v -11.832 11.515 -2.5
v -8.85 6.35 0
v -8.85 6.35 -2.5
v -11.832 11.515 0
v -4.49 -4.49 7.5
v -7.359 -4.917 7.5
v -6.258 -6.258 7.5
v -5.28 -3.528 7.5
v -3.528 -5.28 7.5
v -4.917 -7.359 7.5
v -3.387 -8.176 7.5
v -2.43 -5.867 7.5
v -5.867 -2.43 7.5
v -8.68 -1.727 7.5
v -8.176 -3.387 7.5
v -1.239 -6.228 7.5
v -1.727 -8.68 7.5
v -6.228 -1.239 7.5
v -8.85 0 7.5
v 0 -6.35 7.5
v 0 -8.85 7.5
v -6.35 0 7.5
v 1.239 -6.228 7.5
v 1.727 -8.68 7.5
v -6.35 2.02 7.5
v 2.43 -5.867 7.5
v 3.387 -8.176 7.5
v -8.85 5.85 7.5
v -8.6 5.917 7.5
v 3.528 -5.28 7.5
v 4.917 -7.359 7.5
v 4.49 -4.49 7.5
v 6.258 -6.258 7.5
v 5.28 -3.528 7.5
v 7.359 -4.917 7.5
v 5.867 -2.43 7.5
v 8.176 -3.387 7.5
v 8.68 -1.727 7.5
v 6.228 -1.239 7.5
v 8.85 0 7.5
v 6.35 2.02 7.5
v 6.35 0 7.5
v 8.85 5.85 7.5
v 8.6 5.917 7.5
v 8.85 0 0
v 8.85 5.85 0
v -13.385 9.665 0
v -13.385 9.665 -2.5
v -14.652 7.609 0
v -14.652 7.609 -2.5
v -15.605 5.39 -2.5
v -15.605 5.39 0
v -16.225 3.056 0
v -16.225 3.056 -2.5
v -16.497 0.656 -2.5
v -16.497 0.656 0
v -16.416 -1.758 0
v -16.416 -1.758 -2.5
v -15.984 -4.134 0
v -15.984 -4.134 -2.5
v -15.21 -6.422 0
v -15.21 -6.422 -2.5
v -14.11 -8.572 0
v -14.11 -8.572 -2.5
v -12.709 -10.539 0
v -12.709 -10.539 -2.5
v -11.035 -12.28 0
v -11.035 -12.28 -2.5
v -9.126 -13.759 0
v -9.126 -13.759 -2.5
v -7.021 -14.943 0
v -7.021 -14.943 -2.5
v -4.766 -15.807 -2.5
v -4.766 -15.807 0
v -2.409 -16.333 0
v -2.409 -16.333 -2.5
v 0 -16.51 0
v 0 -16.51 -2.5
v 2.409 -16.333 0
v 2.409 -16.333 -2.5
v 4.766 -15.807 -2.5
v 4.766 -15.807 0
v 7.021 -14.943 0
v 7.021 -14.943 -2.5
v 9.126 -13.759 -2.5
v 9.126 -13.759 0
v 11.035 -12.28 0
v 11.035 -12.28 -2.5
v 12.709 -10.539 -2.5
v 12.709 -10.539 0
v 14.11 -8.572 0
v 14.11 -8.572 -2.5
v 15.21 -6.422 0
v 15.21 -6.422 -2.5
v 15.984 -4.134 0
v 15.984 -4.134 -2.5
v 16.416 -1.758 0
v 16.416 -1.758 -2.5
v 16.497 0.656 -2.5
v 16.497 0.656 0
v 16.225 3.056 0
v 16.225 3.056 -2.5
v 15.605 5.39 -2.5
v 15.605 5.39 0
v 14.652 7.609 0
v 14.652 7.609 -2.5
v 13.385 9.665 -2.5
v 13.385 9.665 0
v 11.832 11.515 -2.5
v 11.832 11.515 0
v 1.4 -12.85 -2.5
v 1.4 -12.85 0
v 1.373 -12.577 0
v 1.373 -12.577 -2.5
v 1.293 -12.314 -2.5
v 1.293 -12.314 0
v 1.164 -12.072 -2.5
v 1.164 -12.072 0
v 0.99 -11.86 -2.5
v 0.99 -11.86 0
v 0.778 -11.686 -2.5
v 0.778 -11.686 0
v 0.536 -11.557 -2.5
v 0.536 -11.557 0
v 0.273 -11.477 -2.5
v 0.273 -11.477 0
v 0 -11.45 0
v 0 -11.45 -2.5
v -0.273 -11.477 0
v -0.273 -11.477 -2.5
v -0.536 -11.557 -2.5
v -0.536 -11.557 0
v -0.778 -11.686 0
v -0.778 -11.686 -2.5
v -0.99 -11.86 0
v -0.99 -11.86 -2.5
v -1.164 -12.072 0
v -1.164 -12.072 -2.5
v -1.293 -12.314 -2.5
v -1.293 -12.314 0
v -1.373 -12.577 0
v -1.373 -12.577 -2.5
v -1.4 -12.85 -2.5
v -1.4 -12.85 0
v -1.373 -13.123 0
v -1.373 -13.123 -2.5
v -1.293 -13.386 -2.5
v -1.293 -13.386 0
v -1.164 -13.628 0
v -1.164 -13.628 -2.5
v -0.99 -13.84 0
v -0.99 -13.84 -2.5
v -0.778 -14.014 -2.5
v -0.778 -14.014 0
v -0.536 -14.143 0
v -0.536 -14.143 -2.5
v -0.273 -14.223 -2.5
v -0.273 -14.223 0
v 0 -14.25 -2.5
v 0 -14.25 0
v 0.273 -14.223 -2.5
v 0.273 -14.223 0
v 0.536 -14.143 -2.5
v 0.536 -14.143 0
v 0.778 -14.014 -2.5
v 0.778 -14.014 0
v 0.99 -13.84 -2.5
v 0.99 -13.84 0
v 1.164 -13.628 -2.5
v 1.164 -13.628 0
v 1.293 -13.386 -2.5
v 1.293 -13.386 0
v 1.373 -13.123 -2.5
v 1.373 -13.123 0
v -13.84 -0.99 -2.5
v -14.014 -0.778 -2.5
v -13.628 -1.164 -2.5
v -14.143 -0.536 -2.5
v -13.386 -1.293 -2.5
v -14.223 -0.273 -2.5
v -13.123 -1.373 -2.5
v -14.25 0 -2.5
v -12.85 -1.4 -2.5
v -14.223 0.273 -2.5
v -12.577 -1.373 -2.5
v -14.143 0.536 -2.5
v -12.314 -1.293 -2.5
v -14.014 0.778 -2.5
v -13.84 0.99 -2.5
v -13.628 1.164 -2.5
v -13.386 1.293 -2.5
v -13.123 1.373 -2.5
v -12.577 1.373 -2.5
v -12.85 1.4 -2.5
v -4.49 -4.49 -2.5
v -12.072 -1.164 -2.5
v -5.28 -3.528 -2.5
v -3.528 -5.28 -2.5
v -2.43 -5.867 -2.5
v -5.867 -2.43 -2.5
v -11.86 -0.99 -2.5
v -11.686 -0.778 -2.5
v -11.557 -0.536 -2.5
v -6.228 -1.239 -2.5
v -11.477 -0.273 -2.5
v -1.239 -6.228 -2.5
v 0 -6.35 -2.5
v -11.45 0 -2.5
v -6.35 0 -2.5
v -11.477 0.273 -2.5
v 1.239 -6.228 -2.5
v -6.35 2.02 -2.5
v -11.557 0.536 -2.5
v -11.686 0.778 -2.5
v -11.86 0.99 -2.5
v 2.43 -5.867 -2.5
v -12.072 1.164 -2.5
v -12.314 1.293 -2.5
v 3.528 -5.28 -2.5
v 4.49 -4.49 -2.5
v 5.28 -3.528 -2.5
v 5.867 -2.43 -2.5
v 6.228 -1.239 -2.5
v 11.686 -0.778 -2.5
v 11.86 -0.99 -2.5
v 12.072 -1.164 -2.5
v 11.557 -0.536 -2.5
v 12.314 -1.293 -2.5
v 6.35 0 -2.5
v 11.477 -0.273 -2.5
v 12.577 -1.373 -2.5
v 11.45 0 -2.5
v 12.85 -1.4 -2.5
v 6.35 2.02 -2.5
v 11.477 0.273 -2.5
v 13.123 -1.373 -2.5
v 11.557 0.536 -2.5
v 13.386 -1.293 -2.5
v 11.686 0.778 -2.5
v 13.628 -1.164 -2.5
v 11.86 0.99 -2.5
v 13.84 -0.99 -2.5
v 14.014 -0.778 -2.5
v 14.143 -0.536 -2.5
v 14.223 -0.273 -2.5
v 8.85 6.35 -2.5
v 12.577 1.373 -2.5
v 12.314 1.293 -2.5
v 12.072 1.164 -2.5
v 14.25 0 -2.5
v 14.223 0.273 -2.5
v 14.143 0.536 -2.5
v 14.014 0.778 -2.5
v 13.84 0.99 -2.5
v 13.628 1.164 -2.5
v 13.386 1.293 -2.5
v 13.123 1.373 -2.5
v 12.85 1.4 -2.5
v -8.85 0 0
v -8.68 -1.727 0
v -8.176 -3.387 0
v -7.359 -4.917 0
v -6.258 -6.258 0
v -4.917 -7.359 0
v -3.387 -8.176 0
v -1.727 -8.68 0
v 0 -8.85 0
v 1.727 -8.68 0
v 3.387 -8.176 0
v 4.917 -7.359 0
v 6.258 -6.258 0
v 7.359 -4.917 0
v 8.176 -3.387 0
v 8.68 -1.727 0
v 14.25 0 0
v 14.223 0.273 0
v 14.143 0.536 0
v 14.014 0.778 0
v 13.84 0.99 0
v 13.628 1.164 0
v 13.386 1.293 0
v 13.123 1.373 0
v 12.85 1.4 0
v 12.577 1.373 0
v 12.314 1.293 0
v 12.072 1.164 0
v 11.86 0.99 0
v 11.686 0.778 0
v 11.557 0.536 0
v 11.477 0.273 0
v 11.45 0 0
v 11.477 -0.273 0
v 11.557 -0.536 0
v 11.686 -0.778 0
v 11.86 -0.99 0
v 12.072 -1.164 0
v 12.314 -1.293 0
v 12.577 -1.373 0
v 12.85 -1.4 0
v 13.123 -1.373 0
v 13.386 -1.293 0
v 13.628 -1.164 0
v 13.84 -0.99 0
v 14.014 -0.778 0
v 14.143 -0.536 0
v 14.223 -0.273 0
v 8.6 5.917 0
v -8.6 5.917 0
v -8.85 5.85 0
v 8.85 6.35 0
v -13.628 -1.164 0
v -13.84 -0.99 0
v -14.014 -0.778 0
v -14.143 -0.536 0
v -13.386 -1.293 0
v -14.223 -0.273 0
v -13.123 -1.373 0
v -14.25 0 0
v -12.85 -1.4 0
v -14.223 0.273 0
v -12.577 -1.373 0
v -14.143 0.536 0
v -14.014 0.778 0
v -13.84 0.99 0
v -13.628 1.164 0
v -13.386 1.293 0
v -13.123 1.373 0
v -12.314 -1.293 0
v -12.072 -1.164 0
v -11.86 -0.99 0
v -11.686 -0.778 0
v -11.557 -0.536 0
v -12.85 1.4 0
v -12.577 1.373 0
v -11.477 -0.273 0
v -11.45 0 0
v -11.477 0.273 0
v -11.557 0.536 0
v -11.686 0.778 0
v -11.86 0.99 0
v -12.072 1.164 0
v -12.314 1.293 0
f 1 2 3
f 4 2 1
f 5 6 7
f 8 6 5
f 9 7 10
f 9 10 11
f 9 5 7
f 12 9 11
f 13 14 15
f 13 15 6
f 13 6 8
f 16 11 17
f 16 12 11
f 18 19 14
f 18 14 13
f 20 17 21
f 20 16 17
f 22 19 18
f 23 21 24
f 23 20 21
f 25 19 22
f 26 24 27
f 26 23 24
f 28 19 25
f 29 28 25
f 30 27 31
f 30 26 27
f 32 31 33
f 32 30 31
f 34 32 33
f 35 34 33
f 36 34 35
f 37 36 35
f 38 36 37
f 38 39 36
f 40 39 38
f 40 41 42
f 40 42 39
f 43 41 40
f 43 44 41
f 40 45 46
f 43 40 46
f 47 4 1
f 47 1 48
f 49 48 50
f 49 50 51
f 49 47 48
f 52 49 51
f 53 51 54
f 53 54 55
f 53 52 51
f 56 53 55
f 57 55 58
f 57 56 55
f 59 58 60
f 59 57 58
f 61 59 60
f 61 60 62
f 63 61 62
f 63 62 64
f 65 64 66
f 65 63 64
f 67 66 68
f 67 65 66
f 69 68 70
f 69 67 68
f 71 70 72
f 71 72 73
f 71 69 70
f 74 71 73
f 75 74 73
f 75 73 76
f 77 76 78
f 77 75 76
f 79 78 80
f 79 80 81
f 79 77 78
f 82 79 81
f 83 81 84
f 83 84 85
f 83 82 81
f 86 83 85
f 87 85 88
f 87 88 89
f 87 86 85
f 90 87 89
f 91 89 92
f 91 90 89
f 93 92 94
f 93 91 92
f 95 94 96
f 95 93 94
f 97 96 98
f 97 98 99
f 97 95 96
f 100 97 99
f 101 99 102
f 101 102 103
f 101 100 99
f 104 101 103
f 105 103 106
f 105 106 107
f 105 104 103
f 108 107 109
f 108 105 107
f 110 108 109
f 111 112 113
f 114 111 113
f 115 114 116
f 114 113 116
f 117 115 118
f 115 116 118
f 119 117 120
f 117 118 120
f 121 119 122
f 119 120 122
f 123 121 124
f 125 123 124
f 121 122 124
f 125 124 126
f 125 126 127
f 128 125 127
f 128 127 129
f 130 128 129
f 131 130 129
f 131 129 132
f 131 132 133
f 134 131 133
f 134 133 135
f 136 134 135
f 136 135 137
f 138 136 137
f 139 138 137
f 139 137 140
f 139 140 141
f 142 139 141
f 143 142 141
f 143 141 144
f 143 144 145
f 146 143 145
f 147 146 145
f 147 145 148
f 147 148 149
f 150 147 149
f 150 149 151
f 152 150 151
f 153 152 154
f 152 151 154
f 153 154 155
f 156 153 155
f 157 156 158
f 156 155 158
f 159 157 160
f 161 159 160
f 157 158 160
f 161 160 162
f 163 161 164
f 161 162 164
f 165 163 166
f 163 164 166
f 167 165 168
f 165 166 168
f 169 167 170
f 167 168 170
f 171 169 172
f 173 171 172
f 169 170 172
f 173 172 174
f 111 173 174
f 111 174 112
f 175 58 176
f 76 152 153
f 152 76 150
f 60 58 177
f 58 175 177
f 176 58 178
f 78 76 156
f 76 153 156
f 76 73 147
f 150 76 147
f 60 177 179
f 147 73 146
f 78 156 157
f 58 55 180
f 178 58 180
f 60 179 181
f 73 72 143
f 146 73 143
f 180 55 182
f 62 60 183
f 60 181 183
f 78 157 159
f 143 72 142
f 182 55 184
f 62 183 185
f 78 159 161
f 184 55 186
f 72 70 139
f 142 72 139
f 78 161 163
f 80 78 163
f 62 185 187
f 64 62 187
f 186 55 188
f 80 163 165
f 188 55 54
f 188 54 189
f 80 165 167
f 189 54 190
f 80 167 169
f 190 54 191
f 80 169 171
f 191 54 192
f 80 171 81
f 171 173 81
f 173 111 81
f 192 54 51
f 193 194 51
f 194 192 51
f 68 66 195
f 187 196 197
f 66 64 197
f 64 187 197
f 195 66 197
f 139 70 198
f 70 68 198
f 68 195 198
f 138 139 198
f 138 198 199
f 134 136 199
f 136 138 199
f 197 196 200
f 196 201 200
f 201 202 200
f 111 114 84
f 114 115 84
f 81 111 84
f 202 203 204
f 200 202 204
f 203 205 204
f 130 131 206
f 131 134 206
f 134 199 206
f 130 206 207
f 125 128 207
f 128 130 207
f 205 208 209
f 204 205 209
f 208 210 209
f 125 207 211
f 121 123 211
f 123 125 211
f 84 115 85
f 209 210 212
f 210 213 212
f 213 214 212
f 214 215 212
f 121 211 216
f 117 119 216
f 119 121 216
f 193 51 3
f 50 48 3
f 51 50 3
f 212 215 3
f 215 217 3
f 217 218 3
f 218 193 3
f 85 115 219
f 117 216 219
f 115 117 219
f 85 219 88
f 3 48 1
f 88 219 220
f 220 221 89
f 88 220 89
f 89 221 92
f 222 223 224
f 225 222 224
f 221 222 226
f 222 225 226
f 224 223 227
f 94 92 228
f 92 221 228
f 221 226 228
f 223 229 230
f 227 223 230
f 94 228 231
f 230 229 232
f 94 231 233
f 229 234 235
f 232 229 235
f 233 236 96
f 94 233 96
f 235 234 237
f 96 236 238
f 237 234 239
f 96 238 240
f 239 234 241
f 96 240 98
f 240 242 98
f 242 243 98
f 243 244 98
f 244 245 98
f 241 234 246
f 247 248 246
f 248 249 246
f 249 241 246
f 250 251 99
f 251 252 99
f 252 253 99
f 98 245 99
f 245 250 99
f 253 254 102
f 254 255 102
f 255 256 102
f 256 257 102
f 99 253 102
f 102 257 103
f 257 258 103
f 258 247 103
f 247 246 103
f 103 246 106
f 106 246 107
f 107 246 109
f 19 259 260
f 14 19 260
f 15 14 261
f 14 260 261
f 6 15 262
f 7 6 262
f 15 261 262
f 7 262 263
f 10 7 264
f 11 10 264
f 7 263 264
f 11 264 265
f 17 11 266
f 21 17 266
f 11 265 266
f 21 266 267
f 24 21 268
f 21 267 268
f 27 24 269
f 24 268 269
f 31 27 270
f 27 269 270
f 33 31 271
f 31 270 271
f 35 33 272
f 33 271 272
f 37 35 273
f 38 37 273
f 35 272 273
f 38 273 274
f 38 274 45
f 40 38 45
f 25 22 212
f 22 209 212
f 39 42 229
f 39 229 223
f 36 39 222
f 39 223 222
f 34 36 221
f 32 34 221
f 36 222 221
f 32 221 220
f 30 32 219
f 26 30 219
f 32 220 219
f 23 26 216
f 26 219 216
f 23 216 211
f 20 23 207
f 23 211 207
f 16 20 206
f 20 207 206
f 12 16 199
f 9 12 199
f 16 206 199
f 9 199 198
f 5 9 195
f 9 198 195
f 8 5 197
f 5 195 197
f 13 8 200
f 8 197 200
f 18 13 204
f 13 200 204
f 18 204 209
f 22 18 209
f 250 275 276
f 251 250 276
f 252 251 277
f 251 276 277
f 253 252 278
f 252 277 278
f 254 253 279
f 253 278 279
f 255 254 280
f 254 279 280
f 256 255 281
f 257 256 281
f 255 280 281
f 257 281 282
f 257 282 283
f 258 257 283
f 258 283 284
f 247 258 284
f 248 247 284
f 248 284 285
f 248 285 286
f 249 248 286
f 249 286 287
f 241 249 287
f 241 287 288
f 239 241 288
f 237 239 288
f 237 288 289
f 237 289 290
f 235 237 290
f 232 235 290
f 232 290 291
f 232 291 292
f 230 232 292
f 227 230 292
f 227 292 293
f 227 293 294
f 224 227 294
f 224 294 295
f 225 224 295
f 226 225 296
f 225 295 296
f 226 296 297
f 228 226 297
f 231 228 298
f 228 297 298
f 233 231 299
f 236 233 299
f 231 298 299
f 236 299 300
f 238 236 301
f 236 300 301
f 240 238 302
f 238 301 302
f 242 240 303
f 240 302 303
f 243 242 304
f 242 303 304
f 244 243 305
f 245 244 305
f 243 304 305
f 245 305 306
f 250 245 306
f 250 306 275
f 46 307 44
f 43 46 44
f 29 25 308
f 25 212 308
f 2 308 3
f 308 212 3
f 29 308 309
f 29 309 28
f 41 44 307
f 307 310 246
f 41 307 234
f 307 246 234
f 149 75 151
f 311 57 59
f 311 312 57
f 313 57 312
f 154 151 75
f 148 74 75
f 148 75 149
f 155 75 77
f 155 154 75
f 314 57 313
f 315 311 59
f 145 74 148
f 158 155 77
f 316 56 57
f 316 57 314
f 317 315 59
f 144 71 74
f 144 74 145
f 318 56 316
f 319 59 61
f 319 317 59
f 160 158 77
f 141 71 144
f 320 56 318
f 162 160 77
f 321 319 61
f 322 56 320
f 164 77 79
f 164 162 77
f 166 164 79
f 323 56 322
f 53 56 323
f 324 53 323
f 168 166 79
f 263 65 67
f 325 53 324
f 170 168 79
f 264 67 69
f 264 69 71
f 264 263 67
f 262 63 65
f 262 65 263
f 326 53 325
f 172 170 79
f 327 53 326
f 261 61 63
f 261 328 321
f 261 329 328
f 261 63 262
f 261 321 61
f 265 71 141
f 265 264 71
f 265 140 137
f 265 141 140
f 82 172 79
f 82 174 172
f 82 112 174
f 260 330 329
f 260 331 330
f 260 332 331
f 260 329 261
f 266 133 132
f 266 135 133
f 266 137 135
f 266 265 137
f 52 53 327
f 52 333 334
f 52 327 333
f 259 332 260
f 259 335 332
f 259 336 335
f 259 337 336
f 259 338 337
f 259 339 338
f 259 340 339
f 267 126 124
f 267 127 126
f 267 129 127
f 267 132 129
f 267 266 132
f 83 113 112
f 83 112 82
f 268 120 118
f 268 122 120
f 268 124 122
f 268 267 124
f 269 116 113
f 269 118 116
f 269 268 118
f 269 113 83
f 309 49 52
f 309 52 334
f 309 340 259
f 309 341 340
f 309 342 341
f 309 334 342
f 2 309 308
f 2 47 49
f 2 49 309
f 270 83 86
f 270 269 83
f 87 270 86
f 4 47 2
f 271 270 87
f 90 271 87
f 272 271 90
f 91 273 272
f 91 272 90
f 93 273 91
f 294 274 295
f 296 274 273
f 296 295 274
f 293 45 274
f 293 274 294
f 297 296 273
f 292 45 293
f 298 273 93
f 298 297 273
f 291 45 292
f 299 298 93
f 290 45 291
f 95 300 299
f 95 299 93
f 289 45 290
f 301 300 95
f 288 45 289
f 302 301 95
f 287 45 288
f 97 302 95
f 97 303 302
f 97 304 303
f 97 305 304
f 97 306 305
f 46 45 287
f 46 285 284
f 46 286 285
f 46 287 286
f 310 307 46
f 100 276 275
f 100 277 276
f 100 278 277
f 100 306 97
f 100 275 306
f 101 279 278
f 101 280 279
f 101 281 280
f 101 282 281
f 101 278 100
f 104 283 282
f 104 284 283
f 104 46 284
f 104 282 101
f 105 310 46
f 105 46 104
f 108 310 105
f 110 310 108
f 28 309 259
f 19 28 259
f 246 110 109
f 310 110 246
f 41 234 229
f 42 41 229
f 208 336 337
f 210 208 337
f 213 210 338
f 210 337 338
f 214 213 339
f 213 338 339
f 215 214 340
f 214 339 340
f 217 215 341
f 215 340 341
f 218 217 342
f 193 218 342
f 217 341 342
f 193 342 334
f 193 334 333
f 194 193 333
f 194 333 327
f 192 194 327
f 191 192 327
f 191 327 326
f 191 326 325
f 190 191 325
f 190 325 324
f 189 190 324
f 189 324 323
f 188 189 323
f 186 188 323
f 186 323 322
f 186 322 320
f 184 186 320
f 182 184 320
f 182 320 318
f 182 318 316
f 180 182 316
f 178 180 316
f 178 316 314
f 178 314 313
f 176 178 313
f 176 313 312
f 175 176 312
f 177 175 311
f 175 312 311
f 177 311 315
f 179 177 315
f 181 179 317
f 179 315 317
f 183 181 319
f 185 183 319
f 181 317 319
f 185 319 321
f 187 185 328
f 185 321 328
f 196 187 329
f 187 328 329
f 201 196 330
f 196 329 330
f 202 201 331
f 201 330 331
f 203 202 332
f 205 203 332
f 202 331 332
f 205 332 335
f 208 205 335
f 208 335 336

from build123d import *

# Parameters (mm, degrees)
F1_DEPTH = 2.5
F2_DEPTH = 7.5
F3_SIZE  = 0.5
F4_R     = 1.4
F5_DEPTH = 25


with BuildPart() as f1:
    # F0 (on Top) → F1 (new body)
    with BuildSketch(Plane.XY):
        with BuildLine():
            Line((11.83183, 11.514682), (8.85, 6.35))
            Line((8.85, 6.35), (8.85, 0))
            ThreePointArc((8.85, 0), (0, -8.85), (-8.85, 0))
            Line((-8.85, 0), (-8.85, 6.35))
            Line((-8.85, 6.35), (-11.83183, 11.514682))
            ThreePointArc((-11.83183, 11.514682), (0, -16.51), (11.83183, 11.514682))
        make_face()
        with BuildLine():
            Line((6.35, 2.019873), (6.35, 0))
            ThreePointArc((6.35, 0), (0, -6.35), (-6.35, 0))
            Line((-6.35, 0), (-6.35, 2.019873))
            Line((-6.35, 2.019873), (-8.85, 6.35))
            Line((-8.85, 6.35), (-8.85, 0))
            ThreePointArc((-8.85, 0), (0, -8.85), (8.85, 0))
            Line((8.85, 0), (8.85, 6.35))
            Line((8.85, 6.35), (6.35, 2.019873))
        make_face()
    extrude(amount=-F1_DEPTH)

    # F0 (on Top) → F2 (join)
    with BuildSketch(Plane.XY):
        with BuildLine():
            Line((6.35, 2.019873), (6.35, 0))
            ThreePointArc((6.35, 0), (0, -6.35), (-6.35, 0))
            Line((-6.35, 0), (-6.35, 2.019873))
            Line((-6.35, 2.019873), (-8.85, 6.35))
            Line((-8.85, 6.35), (-8.85, 0))
            ThreePointArc((-8.85, 0), (0, -8.85), (8.85, 0))
            Line((8.85, 0), (8.85, 6.35))
            Line((8.85, 6.35), (6.35, 2.019873))
        make_face()
    extrude(amount=F2_DEPTH)

    # F3
    f3_edges = [f1.edges().sort_by_distance(p)[0] for p in [
        (-8.85, 6.35, 3.75),
        (8.85, 6.35, 3.75),
    ]]
    chamfer(f3_edges, length=F3_SIZE)

    # F4 (on face) → F5 (cut)
    with BuildSketch(Plane.XY):
        with Locations((-12.85, 0)):
            Circle(F4_R)
        with Locations((12.85, 0)):
            Circle(F4_R)
        with Locations((0, -12.85)):
            Circle(F4_R)
    extrude(amount=-F5_DEPTH, mode=Mode.SUBTRACT)


solid = f1.part
